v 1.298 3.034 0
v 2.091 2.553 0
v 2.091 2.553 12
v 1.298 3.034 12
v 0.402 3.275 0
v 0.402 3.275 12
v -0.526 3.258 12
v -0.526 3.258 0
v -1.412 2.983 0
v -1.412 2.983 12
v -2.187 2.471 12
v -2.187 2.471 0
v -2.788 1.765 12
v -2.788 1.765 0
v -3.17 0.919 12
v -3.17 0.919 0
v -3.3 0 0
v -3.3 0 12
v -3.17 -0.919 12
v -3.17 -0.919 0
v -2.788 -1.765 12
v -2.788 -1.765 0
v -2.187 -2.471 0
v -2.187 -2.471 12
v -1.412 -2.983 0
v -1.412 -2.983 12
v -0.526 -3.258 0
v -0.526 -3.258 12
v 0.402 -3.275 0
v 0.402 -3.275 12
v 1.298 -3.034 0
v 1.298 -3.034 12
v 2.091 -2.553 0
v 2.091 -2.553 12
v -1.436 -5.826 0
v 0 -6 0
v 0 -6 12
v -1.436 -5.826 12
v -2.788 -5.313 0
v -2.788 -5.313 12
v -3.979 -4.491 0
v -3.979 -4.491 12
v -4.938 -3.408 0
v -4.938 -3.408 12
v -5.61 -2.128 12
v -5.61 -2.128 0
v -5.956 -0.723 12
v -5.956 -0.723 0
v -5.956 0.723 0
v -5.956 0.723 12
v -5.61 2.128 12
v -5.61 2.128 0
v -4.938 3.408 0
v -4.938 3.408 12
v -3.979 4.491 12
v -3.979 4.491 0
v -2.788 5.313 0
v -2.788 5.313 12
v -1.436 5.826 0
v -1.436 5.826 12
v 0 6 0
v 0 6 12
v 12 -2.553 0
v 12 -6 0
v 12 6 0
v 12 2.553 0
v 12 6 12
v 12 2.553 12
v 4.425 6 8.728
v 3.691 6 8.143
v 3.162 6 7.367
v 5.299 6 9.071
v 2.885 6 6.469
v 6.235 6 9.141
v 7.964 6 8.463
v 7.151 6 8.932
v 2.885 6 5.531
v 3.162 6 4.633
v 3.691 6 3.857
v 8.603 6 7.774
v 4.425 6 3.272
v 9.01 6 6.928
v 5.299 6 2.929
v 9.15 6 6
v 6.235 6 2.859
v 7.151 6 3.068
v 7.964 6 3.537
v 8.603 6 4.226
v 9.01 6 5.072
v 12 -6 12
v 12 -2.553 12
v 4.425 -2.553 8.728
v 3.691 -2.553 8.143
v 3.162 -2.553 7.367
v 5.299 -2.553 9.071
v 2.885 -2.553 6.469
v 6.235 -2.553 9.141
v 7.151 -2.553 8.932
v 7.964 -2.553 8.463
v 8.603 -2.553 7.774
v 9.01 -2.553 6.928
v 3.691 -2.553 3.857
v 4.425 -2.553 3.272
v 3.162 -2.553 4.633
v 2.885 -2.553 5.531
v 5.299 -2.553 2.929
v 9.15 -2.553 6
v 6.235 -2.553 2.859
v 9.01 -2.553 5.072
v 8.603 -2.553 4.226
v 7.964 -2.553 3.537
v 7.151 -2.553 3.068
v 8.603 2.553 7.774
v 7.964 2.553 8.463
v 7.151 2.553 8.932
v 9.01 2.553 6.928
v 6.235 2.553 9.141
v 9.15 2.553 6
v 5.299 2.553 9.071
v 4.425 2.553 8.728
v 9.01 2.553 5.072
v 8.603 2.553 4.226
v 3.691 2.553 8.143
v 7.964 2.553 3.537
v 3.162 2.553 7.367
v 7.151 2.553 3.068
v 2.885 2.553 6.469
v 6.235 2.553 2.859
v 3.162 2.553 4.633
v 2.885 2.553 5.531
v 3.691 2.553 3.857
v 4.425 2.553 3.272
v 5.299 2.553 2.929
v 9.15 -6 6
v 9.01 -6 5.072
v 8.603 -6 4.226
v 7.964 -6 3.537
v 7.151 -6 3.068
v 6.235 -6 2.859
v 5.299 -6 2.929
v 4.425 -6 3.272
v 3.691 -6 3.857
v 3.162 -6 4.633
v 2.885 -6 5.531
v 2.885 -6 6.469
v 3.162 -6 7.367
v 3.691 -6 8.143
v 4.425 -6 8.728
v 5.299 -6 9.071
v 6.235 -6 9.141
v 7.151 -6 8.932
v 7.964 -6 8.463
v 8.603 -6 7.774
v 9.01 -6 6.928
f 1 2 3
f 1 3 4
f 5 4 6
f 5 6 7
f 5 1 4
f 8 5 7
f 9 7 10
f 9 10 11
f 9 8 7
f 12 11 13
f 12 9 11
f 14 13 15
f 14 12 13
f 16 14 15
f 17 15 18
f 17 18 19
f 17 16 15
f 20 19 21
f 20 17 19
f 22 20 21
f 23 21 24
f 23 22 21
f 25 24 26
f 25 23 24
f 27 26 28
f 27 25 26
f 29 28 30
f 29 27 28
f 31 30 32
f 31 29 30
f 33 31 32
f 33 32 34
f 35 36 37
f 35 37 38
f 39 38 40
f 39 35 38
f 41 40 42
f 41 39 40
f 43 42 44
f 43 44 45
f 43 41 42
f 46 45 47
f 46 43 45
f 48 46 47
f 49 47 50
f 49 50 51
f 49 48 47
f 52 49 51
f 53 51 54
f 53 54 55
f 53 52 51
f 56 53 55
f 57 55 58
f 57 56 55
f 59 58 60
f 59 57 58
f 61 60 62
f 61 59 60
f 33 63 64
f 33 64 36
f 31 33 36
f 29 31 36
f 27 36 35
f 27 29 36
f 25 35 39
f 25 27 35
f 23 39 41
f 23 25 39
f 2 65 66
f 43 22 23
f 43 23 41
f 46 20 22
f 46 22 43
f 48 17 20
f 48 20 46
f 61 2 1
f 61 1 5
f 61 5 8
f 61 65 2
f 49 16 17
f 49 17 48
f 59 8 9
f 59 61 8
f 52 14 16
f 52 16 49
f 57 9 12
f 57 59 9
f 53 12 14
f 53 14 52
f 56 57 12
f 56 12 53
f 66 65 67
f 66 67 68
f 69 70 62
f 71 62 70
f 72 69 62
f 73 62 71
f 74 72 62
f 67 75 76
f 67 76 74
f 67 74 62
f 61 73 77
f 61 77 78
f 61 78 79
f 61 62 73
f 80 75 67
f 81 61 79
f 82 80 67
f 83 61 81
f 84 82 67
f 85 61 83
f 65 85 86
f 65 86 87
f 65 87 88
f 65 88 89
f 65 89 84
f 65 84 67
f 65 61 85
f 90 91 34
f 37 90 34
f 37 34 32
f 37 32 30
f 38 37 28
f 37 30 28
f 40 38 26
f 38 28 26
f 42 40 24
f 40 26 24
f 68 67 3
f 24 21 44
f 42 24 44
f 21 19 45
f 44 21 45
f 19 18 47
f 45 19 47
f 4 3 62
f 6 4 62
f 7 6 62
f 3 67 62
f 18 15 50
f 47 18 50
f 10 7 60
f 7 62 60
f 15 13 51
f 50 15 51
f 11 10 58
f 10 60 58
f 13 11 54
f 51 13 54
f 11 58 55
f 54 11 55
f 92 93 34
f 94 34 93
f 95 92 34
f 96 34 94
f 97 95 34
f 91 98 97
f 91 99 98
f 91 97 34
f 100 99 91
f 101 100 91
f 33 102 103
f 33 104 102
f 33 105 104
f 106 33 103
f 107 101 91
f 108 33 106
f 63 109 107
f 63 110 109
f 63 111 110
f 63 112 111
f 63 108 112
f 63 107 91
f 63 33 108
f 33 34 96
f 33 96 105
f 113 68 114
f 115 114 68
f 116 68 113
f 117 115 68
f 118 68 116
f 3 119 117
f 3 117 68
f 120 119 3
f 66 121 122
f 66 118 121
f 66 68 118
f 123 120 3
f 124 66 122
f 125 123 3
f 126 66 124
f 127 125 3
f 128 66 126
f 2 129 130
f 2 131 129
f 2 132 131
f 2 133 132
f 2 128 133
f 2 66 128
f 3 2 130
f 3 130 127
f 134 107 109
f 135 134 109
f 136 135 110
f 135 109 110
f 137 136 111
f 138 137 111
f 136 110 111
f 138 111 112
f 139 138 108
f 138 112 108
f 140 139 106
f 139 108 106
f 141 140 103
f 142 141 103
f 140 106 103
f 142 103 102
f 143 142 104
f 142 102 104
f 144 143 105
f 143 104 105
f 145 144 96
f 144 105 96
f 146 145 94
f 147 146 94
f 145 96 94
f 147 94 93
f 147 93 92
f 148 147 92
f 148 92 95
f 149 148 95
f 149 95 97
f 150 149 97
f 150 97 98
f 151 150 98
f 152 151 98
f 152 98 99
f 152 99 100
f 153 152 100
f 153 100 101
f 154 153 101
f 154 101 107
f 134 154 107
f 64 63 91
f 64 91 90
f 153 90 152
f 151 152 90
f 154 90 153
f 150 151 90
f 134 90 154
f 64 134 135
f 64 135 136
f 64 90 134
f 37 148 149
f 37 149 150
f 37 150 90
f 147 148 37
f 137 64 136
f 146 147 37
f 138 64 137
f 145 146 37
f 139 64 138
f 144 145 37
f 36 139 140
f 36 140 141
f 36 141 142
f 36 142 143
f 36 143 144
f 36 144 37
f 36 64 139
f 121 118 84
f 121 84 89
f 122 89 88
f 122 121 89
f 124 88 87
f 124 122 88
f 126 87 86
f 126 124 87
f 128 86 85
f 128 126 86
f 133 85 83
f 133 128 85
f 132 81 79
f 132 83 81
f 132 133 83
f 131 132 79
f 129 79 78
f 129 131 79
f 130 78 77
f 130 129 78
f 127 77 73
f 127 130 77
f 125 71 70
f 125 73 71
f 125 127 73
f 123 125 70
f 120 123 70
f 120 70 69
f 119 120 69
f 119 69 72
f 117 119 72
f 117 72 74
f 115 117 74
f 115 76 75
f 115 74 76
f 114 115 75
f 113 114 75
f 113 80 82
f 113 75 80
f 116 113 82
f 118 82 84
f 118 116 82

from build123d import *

# Parameters (mm, degrees)
BOSS_EXTRUDE1_DEPTH     = 12
SKETCH2_R               = 3.15
CUT_EXTRUDE1_DEPTH      = 7
CUT_EXTRUDE1_DEPTH_BACK = 7


with BuildPart() as part:
    # Sketch1 → Boss-Extrude1 (new body)
    with BuildSketch(Plane.XY):
        with BuildLine():
            Line((0, 6), (12, 6))
            Line((12, 6), (12, 2.552710574))
            Line((12, 2.552710574), (2.091331807, 2.552710574))
            ThreePointArc((2.091331807, 2.552710574), (-3.3, 0), (2.091331807, -2.552710574))
            Line((2.091331807, -2.552710574), (12, -2.552710574))
            Line((12, -2.552710574), (12, -6))
            Line((12, -6), (0, -6))
            ThreePointArc((0, -6), (-6, 0), (0, 6))
        make_face()
    extrude(amount=BOSS_EXTRUDE1_DEPTH)

    # Sketch2 → Cut-Extrude1 (cut, two sides)
    with BuildSketch(Plane(origin=(0, 0, 0), x_dir=(1, 0, 0), z_dir=(0, 1, 0))) as cut_extrude1_sk:
        with Locations((6, -6)):
            Circle(SKETCH2_R)
    extrude(amount=CUT_EXTRUDE1_DEPTH, mode=Mode.SUBTRACT)
    extrude(cut_extrude1_sk.sketch, amount=-CUT_EXTRUDE1_DEPTH_BACK, mode=Mode.SUBTRACT)


solid = part.part
